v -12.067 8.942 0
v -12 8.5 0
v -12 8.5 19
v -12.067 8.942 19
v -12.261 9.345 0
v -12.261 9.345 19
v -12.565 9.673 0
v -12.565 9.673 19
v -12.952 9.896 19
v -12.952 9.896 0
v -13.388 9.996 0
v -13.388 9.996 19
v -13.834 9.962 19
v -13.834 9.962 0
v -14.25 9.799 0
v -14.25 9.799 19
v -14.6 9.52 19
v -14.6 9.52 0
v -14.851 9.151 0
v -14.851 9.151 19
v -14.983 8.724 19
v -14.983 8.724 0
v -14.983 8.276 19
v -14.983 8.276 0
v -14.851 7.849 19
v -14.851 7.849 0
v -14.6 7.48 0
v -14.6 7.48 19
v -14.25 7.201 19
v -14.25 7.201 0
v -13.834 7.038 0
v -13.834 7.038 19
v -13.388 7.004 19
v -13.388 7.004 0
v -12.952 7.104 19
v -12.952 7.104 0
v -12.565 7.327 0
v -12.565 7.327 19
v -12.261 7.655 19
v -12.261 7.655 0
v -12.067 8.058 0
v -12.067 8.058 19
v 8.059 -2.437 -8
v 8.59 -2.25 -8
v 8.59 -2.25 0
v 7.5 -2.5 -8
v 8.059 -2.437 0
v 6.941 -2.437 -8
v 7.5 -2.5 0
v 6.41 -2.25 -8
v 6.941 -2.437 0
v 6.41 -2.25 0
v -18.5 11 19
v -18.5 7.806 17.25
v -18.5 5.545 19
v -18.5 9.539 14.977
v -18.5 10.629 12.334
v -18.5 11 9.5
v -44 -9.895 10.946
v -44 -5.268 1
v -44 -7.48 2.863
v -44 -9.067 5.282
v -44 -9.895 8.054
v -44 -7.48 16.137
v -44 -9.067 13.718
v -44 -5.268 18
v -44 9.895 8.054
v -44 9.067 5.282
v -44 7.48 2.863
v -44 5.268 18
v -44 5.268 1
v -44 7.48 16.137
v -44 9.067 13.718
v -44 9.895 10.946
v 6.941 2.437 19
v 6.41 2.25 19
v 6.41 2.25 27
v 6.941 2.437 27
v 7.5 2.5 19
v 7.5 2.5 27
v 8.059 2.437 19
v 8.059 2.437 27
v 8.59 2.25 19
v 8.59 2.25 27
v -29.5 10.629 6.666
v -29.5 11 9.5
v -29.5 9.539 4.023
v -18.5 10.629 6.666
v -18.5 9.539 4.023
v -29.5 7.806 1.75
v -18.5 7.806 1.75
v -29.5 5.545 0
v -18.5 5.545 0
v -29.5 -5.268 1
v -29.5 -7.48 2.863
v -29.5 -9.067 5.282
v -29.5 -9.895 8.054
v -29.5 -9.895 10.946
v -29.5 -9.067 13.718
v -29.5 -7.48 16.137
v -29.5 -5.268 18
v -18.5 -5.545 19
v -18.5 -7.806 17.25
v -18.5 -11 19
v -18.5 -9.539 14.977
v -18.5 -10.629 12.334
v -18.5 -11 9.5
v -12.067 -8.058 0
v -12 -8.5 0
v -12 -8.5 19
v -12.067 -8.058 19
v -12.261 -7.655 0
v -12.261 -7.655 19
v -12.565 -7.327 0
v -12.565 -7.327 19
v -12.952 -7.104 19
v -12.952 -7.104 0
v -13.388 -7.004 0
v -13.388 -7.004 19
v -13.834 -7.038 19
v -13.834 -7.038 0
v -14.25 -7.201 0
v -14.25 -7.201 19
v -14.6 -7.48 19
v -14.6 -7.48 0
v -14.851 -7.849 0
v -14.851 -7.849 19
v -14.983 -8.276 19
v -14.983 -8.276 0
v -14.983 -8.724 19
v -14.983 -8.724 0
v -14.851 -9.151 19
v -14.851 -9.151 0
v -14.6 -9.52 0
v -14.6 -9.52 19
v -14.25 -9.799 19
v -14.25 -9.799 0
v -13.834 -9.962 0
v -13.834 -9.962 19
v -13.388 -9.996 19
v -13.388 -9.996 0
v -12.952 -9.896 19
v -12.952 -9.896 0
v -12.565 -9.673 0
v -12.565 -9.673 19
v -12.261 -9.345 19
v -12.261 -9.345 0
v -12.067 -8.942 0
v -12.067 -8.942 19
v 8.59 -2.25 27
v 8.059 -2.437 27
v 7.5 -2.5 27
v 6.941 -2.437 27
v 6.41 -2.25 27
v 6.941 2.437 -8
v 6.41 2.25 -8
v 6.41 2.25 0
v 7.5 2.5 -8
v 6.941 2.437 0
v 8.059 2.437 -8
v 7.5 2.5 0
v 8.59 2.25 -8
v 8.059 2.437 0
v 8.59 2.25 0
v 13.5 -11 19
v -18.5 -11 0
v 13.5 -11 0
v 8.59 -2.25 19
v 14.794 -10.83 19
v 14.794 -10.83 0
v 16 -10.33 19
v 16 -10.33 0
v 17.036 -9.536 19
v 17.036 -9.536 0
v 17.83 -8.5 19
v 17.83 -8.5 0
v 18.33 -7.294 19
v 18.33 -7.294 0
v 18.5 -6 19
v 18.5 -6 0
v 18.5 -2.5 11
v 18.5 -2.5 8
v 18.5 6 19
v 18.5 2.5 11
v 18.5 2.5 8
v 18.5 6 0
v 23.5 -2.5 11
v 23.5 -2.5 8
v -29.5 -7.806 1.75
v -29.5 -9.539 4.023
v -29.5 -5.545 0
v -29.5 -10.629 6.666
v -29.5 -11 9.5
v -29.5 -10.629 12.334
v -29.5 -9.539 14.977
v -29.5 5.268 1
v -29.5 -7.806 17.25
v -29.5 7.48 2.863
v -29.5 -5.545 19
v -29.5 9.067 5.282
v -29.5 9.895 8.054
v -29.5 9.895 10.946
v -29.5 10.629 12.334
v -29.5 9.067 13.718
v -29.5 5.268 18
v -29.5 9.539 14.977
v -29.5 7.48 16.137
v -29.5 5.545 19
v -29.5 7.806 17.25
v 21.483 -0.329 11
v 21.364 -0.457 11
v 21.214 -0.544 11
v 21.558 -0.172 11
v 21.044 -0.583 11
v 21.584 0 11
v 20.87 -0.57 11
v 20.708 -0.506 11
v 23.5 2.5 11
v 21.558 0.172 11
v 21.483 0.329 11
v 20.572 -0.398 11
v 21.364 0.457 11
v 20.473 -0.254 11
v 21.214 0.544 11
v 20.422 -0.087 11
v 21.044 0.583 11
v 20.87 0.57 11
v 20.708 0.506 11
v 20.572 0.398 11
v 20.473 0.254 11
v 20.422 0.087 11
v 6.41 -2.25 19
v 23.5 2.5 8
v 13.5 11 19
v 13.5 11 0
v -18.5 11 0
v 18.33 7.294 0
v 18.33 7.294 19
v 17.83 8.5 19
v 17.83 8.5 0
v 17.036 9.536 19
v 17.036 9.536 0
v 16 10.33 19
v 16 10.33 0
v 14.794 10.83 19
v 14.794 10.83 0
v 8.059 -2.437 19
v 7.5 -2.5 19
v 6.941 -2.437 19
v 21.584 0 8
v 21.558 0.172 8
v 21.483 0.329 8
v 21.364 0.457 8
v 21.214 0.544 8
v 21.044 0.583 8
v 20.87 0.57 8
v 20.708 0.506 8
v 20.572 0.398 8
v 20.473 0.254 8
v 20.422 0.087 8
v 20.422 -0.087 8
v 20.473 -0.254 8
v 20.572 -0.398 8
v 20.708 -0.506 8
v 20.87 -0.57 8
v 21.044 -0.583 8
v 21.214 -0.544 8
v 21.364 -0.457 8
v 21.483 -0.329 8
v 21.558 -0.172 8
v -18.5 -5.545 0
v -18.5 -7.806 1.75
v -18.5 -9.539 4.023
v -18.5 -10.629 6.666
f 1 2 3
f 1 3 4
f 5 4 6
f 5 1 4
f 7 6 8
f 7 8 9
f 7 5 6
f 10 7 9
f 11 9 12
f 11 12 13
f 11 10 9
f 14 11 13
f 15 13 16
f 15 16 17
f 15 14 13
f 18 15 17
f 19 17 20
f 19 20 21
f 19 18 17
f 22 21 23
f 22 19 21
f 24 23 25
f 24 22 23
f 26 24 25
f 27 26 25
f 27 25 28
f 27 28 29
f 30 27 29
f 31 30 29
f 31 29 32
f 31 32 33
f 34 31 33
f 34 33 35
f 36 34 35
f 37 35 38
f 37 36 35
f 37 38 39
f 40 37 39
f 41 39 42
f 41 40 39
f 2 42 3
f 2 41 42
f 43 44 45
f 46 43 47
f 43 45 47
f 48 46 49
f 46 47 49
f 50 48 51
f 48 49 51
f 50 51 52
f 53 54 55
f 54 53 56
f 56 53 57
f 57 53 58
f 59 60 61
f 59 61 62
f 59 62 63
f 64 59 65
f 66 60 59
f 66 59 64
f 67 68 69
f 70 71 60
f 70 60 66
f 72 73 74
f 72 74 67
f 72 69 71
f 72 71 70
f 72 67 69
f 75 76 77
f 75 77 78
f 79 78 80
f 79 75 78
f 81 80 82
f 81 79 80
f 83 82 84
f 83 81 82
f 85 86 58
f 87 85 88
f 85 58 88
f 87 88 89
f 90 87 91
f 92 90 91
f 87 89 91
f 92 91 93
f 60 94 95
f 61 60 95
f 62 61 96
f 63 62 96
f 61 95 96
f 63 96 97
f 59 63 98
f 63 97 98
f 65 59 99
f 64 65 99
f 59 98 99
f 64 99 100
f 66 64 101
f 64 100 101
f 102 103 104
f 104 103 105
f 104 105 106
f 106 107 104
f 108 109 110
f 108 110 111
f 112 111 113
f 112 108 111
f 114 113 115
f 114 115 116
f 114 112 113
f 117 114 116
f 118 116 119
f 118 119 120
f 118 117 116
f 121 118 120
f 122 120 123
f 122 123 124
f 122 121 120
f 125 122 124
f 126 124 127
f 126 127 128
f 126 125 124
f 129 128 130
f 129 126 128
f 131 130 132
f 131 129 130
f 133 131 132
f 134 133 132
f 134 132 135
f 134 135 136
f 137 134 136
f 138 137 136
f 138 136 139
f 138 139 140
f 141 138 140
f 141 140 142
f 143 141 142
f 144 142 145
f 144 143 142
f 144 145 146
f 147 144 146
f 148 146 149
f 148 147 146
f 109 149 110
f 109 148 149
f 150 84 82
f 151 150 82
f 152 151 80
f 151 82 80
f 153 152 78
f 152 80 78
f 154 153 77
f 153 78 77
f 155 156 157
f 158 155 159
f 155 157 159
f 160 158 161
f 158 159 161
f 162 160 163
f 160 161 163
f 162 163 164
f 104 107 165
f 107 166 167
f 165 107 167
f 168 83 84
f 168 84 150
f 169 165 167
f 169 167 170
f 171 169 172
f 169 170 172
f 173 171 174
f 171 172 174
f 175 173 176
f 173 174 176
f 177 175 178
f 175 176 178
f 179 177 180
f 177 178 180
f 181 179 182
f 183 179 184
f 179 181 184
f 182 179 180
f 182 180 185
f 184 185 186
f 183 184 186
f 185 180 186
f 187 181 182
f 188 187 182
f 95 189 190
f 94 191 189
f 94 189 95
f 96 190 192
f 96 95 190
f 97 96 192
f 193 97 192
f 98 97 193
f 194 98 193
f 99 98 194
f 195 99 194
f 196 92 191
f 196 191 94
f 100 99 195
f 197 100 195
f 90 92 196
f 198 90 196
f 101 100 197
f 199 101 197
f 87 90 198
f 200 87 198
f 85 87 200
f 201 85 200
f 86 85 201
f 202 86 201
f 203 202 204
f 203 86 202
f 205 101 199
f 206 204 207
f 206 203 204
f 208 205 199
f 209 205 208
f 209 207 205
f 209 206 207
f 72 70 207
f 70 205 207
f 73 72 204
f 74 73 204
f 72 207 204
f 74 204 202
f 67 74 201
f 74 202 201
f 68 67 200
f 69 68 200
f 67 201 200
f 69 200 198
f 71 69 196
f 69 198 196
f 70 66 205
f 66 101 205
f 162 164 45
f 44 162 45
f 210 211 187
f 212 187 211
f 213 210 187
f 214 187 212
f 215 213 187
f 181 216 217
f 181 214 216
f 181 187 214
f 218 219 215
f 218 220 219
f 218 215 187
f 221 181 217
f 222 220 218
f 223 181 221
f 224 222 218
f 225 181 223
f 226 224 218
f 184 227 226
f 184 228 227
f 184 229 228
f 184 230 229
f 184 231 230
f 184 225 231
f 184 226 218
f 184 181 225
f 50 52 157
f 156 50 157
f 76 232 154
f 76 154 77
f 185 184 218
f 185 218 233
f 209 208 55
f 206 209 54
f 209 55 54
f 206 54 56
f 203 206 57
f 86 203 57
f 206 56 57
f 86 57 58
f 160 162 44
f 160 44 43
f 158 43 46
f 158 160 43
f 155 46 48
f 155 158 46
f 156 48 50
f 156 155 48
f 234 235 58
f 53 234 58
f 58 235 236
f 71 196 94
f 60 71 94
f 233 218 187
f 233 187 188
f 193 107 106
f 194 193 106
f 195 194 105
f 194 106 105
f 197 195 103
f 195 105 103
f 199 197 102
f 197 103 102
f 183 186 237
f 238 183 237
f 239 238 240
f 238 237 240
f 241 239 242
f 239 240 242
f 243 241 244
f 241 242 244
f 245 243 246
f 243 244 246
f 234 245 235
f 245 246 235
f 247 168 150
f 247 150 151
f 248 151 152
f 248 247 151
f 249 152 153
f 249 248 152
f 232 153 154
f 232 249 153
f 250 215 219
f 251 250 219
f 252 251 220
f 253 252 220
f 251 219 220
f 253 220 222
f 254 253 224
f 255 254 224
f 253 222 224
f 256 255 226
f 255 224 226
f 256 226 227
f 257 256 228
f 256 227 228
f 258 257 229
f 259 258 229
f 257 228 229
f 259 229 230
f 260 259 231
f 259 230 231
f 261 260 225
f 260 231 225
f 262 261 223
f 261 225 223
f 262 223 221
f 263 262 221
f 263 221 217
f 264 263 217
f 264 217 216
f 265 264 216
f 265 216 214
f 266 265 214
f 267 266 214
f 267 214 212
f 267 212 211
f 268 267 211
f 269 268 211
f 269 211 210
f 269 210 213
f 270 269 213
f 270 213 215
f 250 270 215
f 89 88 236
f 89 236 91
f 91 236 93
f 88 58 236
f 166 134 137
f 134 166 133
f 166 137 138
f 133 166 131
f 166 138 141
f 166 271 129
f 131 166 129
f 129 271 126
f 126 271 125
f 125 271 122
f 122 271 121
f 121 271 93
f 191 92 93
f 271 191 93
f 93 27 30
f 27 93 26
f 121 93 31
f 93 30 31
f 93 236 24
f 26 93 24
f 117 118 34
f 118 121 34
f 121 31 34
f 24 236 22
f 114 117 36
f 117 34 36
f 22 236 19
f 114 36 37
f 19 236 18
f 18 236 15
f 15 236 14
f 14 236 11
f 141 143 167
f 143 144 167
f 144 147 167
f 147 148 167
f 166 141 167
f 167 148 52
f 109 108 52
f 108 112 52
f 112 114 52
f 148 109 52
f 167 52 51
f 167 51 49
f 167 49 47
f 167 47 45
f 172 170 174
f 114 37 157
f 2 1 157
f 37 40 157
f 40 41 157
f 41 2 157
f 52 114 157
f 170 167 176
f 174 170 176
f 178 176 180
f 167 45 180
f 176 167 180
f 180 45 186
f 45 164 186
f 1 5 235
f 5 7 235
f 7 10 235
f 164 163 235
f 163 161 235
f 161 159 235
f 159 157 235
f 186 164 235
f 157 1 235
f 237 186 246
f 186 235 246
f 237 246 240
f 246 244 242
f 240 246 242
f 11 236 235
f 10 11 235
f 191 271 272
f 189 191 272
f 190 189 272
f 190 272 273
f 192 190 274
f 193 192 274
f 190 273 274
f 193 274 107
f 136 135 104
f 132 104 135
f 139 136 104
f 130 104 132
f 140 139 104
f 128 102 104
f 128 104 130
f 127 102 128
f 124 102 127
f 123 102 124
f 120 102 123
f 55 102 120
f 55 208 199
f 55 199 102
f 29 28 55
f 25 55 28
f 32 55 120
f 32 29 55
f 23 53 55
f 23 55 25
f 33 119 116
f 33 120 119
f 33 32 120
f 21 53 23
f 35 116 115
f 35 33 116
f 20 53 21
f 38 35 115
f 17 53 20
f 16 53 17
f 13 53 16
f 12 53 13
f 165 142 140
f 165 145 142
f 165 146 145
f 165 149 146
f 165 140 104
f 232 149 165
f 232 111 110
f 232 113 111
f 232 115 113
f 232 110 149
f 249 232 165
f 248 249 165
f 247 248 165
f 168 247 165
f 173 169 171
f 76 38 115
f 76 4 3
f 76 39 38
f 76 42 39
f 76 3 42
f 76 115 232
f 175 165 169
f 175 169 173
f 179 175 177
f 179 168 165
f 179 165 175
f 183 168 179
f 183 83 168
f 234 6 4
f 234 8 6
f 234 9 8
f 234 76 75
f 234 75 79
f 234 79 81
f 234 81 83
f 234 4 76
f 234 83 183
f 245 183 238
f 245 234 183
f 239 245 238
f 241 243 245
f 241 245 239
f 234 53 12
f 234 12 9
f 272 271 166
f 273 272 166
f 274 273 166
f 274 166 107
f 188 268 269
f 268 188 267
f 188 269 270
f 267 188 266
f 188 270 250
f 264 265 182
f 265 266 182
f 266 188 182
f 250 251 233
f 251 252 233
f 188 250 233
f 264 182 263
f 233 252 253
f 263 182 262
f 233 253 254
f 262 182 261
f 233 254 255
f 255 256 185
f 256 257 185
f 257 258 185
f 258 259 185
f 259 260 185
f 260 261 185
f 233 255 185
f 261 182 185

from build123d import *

# Parameters (mm, degrees)
SKETCH1_R                = 1.5
BOSS_EXTRUDE1_DEPTH      = 19
SKETCH2_W                = 3
SKETCH2_H                = 5
BOSS_EXTRUDE2_DEPTH      = 5
SKETCH3_R                = 0.584411026
CUT_EXTRUDE1_DEPTH       = 5
BOSS_EXTRUDE3_DEPTH      = 8
BOSS_EXTRUDE3_DEPTH_BACK = 27
BOSS_EXTRUDE4_DEPTH      = 11
BOSS_EXTRUDE5_DEPTH      = 8.5
BOSS_EXTRUDE6_DEPTH      = 6


with BuildPart() as part:
    # Sketch1 → Boss-Extrude1 (new body)
    with BuildSketch(Plane.XY):
        with BuildLine():
            Line((-18.5, -11), (13.5, -11))
            ThreePointArc((13.5, -11), (17.035533906, -9.535533906), (18.5, -6))
            Line((18.5, -6), (18.5, 6))
            ThreePointArc((18.5, 6), (17.035533906, 9.535533906), (13.5, 11))
            Line((13.5, 11), (-18.5, 11))
            Line((-18.5, 11), (-18.5, -11))
        make_face()
        with Locations((-13.5, 8.5)):
            Circle(SKETCH1_R, mode=Mode.SUBTRACT)
        with Locations((-13.5, -8.5)):
            Circle(SKETCH1_R, mode=Mode.SUBTRACT)
    extrude(amount=BOSS_EXTRUDE1_DEPTH)

    # Sketch2 → Boss-Extrude2 (add)
    with BuildSketch(Plane(origin=(18.5, 0, 0), x_dir=(0, 0, -1), z_dir=(1, 0, 0))):
        with Locations((-9.5, 0)):
            Rectangle(SKETCH2_W, SKETCH2_H)
    extrude(amount=BOSS_EXTRUDE2_DEPTH)

    # Sketch3 → Cut-Extrude1 (cut)
    with BuildSketch(Plane.XY.offset(11)):
        with Locations((21, 0)):
            Circle(SKETCH3_R)
    extrude(amount=-CUT_EXTRUDE1_DEPTH, mode=Mode.SUBTRACT)

    # Sketch4 → Boss-Extrude3 (add, two sides)
    with BuildSketch(Plane.XY.offset(19)) as boss_extrude3_sk:
        with BuildLine():
            Line((8.589724736, 2.25), (8.589724736, -2.25))
            ThreePointArc((8.589724736, -2.25), (7.5, -2.5), (6.410275264, -2.25))
            Line((6.410275264, -2.25), (6.410275264, 2.25))
            ThreePointArc((6.410275264, 2.25), (7.5, 2.5), (8.589724736, 2.25))
        make_face()
    extrude(amount=BOSS_EXTRUDE3_DEPTH)
    extrude(boss_extrude3_sk.sketch, amount=-BOSS_EXTRUDE3_DEPTH_BACK)

    # Sketch5 → Boss-Extrude4 (add)
    with BuildSketch(Plane.ZY.offset(18.5)):
        with BuildLine():
            ThreePointArc((9.500000028, 11), (4.022680904, 9.539338317), (0, 5.545268253))
            Line((0, 5.545268253), (0, -5.545268253))
            ThreePointArc((0, -5.545268253), (4.022680873, -9.539338299), (9.499999955, -11))
            ThreePointArc((9.499999955, -11), (14.977319088, -9.539338321), (19, -5.545268253))
            Line((19, -5.545268253), (19, 5.545268253))
            ThreePointArc((19, 5.545268253), (14.97731912, 9.539338303), (9.500000028, 11))
        make_face()
    extrude(amount=BOSS_EXTRUDE4_DEPTH)

    # Sketch6 → Boss-Extrude5 (add)
    with BuildSketch(Plane.ZY.offset(29.5)):
        with BuildLine():
            Line((1, 5.267826876), (1, -5.267826876))
            ThreePointArc((1, -5.267826876), (9.5, -10), (18, -5.267826876))
            Line((18, -5.267826876), (18, 5.267826876))
            ThreePointArc((18, 5.267826876), (9.5, 10), (1, 5.267826876))
        make_face()
    extrude(amount=BOSS_EXTRUDE5_DEPTH)

    # Sketch7 → Boss-Extrude6 (add)
    with BuildSketch(Plane.ZY.offset(38)):
        with BuildLine():
            ThreePointArc((1, -5.267826876), (9.5, -10), (18, -5.267826876))
            Line((18, -5.267826876), (18, 5.267826876))
            ThreePointArc((18, 5.267826876), (9.5, 10), (1, 5.267826876))
            Line((1, 5.267826876), (1, -5.267826876))
        make_face()
    extrude(amount=BOSS_EXTRUDE6_DEPTH)


solid = part.part
